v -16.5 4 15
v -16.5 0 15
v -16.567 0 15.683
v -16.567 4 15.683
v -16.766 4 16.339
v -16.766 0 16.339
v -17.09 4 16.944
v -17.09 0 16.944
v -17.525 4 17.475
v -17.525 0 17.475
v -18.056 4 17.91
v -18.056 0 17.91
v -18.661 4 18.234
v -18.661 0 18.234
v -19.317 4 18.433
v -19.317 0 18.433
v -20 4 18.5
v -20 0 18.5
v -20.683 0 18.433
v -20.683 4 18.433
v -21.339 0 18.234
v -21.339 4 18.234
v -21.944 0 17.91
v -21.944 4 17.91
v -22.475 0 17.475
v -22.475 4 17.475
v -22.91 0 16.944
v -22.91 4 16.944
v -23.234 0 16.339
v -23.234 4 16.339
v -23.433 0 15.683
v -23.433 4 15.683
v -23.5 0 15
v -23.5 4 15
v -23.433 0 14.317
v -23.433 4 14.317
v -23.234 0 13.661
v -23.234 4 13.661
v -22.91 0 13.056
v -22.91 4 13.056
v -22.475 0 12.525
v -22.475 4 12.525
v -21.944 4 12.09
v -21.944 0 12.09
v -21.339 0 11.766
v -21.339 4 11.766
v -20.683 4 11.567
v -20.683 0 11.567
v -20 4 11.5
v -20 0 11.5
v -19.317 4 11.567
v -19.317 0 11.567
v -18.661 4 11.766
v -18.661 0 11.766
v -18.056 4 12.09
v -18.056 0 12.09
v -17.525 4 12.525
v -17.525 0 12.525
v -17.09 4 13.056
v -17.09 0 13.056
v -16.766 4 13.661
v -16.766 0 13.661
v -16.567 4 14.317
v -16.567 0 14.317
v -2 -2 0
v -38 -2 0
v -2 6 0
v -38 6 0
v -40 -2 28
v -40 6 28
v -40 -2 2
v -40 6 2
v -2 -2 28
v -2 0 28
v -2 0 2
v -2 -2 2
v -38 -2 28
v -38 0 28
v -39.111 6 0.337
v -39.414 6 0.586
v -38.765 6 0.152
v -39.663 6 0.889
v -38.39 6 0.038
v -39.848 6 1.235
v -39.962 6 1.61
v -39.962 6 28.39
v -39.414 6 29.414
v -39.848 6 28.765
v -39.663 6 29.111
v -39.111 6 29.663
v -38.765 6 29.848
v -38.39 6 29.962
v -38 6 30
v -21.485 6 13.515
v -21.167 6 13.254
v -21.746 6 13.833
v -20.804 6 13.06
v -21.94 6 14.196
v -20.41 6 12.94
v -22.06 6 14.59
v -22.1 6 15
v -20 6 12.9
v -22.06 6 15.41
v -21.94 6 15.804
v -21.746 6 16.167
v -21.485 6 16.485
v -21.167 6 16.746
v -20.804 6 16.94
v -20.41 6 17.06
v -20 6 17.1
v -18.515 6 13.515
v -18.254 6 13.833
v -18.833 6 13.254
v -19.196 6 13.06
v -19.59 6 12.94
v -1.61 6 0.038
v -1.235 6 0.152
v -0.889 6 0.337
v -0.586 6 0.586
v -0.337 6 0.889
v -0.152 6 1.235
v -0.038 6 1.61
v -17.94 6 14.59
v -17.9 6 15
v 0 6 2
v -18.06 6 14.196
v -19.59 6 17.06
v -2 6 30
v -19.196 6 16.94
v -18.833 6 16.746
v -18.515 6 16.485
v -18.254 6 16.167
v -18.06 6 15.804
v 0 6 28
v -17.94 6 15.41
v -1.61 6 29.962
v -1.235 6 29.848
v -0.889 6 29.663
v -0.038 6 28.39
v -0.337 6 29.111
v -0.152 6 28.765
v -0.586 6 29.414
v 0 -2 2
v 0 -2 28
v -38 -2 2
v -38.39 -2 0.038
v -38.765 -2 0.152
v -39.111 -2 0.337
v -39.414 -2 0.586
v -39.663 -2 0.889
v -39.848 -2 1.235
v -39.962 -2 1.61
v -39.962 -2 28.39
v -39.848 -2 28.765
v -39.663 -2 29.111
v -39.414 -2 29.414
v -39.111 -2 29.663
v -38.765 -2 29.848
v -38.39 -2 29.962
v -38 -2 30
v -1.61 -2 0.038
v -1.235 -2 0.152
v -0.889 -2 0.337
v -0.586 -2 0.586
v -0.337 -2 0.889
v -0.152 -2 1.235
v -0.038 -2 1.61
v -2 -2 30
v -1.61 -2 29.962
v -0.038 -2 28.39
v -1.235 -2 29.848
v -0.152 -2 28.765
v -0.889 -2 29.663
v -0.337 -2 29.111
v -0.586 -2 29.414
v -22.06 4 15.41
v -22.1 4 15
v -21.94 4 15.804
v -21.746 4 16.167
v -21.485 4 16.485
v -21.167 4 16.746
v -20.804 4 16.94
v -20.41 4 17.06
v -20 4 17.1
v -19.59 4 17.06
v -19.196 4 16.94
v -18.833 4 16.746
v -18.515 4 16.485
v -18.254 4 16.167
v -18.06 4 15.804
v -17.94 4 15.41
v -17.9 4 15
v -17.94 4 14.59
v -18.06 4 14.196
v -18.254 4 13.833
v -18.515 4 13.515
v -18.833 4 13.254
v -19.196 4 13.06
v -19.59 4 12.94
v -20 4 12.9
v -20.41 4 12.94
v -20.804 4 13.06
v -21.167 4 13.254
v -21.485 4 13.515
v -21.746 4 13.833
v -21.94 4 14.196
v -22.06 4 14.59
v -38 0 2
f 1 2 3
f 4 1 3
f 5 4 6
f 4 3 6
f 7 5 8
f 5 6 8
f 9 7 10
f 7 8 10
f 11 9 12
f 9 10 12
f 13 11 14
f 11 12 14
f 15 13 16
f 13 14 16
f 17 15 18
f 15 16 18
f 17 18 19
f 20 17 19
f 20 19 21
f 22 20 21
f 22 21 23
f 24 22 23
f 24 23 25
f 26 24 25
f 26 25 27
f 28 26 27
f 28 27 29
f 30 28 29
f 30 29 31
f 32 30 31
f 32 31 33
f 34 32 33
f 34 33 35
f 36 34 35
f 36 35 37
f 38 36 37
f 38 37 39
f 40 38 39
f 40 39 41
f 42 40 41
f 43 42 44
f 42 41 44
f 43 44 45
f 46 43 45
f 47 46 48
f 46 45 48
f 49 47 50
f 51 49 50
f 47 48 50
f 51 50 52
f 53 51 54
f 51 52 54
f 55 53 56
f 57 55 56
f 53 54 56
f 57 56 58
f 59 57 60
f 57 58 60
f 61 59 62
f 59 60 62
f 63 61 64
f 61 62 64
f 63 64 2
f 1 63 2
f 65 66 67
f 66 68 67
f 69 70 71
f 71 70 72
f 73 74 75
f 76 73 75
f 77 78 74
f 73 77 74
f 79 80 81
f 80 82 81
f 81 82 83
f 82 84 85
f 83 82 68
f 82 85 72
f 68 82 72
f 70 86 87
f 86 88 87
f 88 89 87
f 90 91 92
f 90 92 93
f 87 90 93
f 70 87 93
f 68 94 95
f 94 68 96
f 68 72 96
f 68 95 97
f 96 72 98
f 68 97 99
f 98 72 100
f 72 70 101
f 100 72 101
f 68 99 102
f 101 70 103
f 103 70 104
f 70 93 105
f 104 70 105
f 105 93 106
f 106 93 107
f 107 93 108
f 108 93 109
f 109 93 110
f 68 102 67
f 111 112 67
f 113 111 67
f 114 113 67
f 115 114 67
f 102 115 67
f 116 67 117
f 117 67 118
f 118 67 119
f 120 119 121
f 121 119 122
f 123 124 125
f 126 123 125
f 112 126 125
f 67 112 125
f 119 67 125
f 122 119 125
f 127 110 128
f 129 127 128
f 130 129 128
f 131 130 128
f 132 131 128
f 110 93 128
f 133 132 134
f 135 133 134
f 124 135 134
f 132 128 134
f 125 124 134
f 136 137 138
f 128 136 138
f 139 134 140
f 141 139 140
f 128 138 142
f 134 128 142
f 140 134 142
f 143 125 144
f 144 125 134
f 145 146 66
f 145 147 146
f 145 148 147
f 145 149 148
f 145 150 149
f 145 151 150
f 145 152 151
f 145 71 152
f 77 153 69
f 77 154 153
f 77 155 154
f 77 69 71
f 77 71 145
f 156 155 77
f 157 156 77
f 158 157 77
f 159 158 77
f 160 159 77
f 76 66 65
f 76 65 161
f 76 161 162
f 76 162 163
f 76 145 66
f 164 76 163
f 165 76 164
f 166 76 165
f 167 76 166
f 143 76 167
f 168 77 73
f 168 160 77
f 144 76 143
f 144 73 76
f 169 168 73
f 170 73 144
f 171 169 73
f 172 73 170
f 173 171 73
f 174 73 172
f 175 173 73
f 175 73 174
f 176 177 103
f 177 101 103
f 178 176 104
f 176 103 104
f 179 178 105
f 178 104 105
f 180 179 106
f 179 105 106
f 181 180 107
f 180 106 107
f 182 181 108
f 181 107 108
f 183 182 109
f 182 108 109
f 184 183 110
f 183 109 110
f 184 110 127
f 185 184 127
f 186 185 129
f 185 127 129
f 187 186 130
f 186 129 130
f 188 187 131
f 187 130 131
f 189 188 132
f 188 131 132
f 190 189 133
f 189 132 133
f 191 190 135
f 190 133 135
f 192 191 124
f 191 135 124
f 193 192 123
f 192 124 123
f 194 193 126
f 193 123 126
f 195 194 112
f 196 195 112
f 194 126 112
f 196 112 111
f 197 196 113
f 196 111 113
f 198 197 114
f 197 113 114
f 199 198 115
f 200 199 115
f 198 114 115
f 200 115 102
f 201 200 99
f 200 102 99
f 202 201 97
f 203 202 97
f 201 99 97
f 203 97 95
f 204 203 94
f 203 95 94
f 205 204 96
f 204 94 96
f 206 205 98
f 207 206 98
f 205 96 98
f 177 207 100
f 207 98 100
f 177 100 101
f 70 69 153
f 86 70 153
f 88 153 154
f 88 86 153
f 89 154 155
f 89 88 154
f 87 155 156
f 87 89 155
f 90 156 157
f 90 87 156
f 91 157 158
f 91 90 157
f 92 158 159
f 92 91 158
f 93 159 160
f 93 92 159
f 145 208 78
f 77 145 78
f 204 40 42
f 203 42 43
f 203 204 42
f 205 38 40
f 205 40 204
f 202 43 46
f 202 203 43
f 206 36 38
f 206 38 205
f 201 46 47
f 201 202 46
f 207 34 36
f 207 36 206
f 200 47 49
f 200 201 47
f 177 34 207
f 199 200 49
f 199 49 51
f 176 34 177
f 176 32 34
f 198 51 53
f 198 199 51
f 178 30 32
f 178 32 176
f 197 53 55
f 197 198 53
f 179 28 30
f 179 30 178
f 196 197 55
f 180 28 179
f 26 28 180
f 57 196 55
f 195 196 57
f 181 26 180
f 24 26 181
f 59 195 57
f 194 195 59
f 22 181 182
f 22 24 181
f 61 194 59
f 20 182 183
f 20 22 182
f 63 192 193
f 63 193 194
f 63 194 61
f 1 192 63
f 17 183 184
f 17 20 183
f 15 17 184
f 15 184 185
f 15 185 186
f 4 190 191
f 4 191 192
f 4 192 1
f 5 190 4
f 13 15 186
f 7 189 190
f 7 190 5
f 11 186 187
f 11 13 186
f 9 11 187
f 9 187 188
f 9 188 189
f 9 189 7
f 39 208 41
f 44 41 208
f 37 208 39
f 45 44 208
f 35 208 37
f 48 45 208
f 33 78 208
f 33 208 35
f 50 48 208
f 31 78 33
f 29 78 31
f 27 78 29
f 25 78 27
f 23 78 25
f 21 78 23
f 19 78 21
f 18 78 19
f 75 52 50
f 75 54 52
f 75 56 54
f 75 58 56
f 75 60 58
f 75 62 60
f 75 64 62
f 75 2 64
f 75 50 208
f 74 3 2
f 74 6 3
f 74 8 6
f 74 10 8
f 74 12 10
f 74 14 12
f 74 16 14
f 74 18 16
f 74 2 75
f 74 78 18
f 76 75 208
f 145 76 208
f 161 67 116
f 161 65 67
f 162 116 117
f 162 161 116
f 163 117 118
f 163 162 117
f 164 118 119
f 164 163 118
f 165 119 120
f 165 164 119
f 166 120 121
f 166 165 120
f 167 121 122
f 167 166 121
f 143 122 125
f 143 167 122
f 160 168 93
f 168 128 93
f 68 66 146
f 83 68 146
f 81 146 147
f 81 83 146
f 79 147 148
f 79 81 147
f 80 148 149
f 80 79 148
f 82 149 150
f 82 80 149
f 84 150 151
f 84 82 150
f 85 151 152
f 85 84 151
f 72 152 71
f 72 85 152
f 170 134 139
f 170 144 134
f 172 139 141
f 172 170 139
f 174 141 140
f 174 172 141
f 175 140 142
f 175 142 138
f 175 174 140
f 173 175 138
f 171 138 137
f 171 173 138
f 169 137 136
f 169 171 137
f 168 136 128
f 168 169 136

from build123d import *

# Parameters (mm, degrees)
F1_DEPTH       = 6
F2_DEPTH       = 2
F3_D           = 4.2
F3_DEPTH       = 15
F3_CBORE_D     = 7
F3_CBORE_DEPTH = 4
F4_R           = 2


with BuildPart() as f1:
    # F0 (on Front) → F1 (new body)
    with BuildSketch(Plane.XZ):
        Polygon((-40, 0), (0, 0), (0, 30), (-40, 30), (-40, 15), align=None)
        Polygon((-38, 2), (-38, 15), (-38, 28), (-2, 28), (-2, 2), align=None, mode=Mode.SUBTRACT)
        Polygon((-38, 28), (-38, 15), (-38, 2), (-2, 2), (-2, 28), align=None)
    extrude(amount=-F1_DEPTH)

    # F0 (on Front) → F2 (join)
    with BuildSketch(Plane.XZ):
        Polygon((-40, 0), (0, 0), (0, 30), (-40, 30), (-40, 15), align=None)
        Polygon((-38, 2), (-38, 15), (-38, 28), (-2, 28), (-2, 2), align=None, mode=Mode.SUBTRACT)
    extrude(amount=F2_DEPTH)

    # F3
    with Locations(Plane.XZ):
        with Locations((-20, 15)):
            CounterBoreHole(F3_D / 2, F3_CBORE_D / 2, F3_CBORE_DEPTH, depth=F3_DEPTH)

    # F4
    f4_edges = [f1.edges().sort_by_distance(p)[0] for p in [
        (-40, 2, 30),
        (0, 2, 30),
        (0, 2, 0),
        (-40, 2, 0),
    ]]
    fillet(f4_edges, radius=F4_R)


solid = f1.part
